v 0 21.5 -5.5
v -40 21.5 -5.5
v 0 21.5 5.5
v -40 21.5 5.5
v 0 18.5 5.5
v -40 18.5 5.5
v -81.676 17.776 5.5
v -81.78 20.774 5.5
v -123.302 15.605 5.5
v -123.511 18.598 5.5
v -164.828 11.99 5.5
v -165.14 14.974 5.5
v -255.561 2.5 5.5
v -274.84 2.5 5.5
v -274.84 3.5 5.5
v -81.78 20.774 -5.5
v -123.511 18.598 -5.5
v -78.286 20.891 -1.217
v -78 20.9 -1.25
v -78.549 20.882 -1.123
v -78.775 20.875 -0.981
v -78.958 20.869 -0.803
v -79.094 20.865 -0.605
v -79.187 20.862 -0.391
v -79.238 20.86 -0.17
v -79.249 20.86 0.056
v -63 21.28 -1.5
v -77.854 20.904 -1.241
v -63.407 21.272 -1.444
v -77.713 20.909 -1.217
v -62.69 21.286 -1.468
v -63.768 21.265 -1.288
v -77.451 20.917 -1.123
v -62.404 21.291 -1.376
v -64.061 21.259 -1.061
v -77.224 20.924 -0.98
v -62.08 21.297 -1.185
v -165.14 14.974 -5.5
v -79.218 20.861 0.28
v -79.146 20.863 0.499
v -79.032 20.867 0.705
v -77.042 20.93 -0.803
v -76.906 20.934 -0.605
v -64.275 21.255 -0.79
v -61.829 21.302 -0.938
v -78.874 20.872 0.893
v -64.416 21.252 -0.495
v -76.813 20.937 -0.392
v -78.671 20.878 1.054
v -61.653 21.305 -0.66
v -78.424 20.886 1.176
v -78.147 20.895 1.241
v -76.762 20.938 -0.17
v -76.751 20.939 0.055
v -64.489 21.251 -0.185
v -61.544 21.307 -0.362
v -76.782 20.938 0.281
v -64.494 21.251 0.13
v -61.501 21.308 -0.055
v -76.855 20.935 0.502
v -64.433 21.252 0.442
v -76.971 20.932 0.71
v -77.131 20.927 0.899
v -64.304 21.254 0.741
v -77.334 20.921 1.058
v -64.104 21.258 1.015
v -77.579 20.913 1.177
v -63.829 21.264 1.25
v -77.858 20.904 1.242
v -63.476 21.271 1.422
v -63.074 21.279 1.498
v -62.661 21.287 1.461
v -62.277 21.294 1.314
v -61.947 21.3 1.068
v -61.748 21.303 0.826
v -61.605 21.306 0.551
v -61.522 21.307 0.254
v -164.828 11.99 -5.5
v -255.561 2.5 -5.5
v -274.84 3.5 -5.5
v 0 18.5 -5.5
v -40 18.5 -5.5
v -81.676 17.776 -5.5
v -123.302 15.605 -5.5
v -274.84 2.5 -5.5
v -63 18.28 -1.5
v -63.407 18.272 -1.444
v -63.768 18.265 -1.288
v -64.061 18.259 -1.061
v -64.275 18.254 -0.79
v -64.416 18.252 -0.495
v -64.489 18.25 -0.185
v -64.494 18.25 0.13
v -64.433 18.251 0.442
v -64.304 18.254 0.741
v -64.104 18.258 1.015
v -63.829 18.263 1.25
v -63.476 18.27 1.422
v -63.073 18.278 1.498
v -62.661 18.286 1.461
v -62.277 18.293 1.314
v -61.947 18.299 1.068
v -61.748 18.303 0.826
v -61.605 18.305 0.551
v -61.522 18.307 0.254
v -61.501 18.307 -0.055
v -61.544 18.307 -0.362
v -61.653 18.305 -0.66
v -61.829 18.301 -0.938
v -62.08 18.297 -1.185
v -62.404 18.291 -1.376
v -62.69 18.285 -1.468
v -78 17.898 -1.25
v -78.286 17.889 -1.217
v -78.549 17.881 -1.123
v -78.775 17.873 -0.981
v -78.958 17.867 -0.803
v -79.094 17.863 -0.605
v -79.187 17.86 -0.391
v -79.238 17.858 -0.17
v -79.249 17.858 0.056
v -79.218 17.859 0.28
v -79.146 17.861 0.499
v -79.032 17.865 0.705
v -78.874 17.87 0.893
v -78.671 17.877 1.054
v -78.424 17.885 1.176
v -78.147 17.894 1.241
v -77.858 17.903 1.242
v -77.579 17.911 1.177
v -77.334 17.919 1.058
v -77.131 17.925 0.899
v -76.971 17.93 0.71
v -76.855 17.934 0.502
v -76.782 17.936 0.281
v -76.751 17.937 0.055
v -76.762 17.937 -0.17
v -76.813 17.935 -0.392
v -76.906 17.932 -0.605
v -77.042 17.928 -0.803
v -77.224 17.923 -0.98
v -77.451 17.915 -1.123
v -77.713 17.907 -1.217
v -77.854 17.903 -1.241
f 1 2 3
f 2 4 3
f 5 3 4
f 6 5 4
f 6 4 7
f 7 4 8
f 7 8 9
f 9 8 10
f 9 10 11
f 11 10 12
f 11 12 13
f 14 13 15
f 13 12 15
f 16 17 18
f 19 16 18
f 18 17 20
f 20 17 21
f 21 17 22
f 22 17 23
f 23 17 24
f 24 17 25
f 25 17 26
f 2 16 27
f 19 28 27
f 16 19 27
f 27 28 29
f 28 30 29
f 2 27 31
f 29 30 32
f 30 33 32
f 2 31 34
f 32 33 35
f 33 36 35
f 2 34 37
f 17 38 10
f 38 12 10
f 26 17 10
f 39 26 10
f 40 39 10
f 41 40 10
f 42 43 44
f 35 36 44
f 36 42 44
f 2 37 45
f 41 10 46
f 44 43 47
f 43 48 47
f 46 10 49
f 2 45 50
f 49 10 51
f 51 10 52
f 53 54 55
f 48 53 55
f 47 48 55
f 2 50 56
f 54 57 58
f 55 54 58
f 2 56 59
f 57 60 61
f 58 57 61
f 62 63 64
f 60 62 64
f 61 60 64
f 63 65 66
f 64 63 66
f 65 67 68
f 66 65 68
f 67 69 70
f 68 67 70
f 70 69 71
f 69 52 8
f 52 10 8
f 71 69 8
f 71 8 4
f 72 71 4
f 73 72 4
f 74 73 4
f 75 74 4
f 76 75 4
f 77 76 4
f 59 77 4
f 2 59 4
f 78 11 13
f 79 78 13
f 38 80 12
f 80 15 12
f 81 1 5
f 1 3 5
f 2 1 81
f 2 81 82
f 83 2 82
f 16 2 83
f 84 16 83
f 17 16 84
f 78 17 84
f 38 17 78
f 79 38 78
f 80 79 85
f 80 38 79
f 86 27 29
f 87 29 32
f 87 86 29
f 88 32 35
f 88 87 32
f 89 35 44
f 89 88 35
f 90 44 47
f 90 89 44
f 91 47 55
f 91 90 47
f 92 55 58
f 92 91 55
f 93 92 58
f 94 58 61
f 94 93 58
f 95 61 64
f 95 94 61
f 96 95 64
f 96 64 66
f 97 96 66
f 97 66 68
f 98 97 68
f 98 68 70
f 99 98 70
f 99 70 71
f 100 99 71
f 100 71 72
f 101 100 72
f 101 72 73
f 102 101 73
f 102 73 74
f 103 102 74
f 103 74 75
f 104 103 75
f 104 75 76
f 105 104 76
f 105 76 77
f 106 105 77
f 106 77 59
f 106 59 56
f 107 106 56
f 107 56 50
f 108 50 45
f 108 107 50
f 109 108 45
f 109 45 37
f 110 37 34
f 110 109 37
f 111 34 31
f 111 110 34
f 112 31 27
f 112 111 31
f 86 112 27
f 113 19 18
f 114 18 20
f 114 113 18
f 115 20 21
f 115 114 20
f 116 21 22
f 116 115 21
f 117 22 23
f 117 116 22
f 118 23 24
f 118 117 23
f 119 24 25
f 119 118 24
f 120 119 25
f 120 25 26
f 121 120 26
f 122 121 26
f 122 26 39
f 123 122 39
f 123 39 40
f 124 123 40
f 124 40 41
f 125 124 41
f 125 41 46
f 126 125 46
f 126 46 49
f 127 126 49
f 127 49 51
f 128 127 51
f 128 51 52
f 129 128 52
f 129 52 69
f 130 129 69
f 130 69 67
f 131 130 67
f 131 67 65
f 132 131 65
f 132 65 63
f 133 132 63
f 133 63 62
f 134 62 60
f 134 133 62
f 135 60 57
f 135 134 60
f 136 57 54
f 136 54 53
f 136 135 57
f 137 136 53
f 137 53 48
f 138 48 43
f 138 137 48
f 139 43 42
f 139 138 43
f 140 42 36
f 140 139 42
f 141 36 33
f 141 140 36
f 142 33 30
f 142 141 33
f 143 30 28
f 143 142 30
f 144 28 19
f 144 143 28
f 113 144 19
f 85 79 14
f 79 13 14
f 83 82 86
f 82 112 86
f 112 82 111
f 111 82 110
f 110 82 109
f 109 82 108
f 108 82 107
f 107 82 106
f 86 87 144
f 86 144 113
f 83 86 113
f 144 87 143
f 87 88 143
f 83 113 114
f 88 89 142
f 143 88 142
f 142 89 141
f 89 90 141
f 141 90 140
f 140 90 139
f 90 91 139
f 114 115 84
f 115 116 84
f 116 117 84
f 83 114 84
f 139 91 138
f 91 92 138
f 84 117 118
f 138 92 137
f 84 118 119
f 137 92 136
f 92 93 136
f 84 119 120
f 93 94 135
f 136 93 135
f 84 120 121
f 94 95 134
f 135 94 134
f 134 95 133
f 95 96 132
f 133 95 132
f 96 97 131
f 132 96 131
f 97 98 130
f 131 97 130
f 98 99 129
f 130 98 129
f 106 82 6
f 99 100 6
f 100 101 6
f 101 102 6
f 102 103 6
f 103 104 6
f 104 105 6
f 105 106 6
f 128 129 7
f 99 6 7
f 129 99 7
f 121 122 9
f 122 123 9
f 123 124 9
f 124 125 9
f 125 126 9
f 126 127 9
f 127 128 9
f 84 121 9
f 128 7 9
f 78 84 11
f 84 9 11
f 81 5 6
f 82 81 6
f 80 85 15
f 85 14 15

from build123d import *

# Parameters (mm, degrees)
EXTRUDE1_DEPTH     = 5.5
SKETCH2_R          = 1.5
SKETCH2_R_2        = 1.25
CUT_EXTRUDE1_DEPTH = 22.5


with BuildPart() as part:
    # Sketch1 → Extrude1 (new body, symmetric)
    with BuildSketch(Plane.XY):
        with BuildLine():
            Line((-164.827821897, 11.989846995), (-255.561088457, 2.5))
            Line((-255.561088457, 2.5), (-274.839724553, 2.5))
            Line((-274.839724553, 2.5), (-274.839724553, 3.5))
            Line((-274.839724553, 3.5), (-165.139891452, 14.973571613))
            ThreePointArc((-165.139891452, 14.973571613), (-102.654981247, 19.86728494), (-40, 21.5))
            Line((-40, 21.5), (0, 21.5))
            Line((0, 21.5), (0, 18.5))
            Line((0, 18.5), (-40, 18.5))
            ThreePointArc((-40, 18.5), (-102.498734411, 16.871356549), (-164.827821897, 11.989846995))
        make_face()
    extrude(amount=EXTRUDE1_DEPTH, both=True)

    # Sketch2 → Cut-Extrude1 (cut, through all)
    with BuildSketch(Plane(origin=(0, 0, 0), x_dir=(1, 0, 0), z_dir=(0, 1, 0))):
        with Locations(Location((-63, 0, 0), (0, 0, 90))):  # turned: the seam where the file's is
            Circle(SKETCH2_R)
        with Locations(Location((-78, 0, 0), (0, 0, 90))):  # turned: the seam where the file's is
            Circle(SKETCH2_R_2)
    extrude(amount=CUT_EXTRUDE1_DEPTH, mode=Mode.SUBTRACT)


solid = part.part
